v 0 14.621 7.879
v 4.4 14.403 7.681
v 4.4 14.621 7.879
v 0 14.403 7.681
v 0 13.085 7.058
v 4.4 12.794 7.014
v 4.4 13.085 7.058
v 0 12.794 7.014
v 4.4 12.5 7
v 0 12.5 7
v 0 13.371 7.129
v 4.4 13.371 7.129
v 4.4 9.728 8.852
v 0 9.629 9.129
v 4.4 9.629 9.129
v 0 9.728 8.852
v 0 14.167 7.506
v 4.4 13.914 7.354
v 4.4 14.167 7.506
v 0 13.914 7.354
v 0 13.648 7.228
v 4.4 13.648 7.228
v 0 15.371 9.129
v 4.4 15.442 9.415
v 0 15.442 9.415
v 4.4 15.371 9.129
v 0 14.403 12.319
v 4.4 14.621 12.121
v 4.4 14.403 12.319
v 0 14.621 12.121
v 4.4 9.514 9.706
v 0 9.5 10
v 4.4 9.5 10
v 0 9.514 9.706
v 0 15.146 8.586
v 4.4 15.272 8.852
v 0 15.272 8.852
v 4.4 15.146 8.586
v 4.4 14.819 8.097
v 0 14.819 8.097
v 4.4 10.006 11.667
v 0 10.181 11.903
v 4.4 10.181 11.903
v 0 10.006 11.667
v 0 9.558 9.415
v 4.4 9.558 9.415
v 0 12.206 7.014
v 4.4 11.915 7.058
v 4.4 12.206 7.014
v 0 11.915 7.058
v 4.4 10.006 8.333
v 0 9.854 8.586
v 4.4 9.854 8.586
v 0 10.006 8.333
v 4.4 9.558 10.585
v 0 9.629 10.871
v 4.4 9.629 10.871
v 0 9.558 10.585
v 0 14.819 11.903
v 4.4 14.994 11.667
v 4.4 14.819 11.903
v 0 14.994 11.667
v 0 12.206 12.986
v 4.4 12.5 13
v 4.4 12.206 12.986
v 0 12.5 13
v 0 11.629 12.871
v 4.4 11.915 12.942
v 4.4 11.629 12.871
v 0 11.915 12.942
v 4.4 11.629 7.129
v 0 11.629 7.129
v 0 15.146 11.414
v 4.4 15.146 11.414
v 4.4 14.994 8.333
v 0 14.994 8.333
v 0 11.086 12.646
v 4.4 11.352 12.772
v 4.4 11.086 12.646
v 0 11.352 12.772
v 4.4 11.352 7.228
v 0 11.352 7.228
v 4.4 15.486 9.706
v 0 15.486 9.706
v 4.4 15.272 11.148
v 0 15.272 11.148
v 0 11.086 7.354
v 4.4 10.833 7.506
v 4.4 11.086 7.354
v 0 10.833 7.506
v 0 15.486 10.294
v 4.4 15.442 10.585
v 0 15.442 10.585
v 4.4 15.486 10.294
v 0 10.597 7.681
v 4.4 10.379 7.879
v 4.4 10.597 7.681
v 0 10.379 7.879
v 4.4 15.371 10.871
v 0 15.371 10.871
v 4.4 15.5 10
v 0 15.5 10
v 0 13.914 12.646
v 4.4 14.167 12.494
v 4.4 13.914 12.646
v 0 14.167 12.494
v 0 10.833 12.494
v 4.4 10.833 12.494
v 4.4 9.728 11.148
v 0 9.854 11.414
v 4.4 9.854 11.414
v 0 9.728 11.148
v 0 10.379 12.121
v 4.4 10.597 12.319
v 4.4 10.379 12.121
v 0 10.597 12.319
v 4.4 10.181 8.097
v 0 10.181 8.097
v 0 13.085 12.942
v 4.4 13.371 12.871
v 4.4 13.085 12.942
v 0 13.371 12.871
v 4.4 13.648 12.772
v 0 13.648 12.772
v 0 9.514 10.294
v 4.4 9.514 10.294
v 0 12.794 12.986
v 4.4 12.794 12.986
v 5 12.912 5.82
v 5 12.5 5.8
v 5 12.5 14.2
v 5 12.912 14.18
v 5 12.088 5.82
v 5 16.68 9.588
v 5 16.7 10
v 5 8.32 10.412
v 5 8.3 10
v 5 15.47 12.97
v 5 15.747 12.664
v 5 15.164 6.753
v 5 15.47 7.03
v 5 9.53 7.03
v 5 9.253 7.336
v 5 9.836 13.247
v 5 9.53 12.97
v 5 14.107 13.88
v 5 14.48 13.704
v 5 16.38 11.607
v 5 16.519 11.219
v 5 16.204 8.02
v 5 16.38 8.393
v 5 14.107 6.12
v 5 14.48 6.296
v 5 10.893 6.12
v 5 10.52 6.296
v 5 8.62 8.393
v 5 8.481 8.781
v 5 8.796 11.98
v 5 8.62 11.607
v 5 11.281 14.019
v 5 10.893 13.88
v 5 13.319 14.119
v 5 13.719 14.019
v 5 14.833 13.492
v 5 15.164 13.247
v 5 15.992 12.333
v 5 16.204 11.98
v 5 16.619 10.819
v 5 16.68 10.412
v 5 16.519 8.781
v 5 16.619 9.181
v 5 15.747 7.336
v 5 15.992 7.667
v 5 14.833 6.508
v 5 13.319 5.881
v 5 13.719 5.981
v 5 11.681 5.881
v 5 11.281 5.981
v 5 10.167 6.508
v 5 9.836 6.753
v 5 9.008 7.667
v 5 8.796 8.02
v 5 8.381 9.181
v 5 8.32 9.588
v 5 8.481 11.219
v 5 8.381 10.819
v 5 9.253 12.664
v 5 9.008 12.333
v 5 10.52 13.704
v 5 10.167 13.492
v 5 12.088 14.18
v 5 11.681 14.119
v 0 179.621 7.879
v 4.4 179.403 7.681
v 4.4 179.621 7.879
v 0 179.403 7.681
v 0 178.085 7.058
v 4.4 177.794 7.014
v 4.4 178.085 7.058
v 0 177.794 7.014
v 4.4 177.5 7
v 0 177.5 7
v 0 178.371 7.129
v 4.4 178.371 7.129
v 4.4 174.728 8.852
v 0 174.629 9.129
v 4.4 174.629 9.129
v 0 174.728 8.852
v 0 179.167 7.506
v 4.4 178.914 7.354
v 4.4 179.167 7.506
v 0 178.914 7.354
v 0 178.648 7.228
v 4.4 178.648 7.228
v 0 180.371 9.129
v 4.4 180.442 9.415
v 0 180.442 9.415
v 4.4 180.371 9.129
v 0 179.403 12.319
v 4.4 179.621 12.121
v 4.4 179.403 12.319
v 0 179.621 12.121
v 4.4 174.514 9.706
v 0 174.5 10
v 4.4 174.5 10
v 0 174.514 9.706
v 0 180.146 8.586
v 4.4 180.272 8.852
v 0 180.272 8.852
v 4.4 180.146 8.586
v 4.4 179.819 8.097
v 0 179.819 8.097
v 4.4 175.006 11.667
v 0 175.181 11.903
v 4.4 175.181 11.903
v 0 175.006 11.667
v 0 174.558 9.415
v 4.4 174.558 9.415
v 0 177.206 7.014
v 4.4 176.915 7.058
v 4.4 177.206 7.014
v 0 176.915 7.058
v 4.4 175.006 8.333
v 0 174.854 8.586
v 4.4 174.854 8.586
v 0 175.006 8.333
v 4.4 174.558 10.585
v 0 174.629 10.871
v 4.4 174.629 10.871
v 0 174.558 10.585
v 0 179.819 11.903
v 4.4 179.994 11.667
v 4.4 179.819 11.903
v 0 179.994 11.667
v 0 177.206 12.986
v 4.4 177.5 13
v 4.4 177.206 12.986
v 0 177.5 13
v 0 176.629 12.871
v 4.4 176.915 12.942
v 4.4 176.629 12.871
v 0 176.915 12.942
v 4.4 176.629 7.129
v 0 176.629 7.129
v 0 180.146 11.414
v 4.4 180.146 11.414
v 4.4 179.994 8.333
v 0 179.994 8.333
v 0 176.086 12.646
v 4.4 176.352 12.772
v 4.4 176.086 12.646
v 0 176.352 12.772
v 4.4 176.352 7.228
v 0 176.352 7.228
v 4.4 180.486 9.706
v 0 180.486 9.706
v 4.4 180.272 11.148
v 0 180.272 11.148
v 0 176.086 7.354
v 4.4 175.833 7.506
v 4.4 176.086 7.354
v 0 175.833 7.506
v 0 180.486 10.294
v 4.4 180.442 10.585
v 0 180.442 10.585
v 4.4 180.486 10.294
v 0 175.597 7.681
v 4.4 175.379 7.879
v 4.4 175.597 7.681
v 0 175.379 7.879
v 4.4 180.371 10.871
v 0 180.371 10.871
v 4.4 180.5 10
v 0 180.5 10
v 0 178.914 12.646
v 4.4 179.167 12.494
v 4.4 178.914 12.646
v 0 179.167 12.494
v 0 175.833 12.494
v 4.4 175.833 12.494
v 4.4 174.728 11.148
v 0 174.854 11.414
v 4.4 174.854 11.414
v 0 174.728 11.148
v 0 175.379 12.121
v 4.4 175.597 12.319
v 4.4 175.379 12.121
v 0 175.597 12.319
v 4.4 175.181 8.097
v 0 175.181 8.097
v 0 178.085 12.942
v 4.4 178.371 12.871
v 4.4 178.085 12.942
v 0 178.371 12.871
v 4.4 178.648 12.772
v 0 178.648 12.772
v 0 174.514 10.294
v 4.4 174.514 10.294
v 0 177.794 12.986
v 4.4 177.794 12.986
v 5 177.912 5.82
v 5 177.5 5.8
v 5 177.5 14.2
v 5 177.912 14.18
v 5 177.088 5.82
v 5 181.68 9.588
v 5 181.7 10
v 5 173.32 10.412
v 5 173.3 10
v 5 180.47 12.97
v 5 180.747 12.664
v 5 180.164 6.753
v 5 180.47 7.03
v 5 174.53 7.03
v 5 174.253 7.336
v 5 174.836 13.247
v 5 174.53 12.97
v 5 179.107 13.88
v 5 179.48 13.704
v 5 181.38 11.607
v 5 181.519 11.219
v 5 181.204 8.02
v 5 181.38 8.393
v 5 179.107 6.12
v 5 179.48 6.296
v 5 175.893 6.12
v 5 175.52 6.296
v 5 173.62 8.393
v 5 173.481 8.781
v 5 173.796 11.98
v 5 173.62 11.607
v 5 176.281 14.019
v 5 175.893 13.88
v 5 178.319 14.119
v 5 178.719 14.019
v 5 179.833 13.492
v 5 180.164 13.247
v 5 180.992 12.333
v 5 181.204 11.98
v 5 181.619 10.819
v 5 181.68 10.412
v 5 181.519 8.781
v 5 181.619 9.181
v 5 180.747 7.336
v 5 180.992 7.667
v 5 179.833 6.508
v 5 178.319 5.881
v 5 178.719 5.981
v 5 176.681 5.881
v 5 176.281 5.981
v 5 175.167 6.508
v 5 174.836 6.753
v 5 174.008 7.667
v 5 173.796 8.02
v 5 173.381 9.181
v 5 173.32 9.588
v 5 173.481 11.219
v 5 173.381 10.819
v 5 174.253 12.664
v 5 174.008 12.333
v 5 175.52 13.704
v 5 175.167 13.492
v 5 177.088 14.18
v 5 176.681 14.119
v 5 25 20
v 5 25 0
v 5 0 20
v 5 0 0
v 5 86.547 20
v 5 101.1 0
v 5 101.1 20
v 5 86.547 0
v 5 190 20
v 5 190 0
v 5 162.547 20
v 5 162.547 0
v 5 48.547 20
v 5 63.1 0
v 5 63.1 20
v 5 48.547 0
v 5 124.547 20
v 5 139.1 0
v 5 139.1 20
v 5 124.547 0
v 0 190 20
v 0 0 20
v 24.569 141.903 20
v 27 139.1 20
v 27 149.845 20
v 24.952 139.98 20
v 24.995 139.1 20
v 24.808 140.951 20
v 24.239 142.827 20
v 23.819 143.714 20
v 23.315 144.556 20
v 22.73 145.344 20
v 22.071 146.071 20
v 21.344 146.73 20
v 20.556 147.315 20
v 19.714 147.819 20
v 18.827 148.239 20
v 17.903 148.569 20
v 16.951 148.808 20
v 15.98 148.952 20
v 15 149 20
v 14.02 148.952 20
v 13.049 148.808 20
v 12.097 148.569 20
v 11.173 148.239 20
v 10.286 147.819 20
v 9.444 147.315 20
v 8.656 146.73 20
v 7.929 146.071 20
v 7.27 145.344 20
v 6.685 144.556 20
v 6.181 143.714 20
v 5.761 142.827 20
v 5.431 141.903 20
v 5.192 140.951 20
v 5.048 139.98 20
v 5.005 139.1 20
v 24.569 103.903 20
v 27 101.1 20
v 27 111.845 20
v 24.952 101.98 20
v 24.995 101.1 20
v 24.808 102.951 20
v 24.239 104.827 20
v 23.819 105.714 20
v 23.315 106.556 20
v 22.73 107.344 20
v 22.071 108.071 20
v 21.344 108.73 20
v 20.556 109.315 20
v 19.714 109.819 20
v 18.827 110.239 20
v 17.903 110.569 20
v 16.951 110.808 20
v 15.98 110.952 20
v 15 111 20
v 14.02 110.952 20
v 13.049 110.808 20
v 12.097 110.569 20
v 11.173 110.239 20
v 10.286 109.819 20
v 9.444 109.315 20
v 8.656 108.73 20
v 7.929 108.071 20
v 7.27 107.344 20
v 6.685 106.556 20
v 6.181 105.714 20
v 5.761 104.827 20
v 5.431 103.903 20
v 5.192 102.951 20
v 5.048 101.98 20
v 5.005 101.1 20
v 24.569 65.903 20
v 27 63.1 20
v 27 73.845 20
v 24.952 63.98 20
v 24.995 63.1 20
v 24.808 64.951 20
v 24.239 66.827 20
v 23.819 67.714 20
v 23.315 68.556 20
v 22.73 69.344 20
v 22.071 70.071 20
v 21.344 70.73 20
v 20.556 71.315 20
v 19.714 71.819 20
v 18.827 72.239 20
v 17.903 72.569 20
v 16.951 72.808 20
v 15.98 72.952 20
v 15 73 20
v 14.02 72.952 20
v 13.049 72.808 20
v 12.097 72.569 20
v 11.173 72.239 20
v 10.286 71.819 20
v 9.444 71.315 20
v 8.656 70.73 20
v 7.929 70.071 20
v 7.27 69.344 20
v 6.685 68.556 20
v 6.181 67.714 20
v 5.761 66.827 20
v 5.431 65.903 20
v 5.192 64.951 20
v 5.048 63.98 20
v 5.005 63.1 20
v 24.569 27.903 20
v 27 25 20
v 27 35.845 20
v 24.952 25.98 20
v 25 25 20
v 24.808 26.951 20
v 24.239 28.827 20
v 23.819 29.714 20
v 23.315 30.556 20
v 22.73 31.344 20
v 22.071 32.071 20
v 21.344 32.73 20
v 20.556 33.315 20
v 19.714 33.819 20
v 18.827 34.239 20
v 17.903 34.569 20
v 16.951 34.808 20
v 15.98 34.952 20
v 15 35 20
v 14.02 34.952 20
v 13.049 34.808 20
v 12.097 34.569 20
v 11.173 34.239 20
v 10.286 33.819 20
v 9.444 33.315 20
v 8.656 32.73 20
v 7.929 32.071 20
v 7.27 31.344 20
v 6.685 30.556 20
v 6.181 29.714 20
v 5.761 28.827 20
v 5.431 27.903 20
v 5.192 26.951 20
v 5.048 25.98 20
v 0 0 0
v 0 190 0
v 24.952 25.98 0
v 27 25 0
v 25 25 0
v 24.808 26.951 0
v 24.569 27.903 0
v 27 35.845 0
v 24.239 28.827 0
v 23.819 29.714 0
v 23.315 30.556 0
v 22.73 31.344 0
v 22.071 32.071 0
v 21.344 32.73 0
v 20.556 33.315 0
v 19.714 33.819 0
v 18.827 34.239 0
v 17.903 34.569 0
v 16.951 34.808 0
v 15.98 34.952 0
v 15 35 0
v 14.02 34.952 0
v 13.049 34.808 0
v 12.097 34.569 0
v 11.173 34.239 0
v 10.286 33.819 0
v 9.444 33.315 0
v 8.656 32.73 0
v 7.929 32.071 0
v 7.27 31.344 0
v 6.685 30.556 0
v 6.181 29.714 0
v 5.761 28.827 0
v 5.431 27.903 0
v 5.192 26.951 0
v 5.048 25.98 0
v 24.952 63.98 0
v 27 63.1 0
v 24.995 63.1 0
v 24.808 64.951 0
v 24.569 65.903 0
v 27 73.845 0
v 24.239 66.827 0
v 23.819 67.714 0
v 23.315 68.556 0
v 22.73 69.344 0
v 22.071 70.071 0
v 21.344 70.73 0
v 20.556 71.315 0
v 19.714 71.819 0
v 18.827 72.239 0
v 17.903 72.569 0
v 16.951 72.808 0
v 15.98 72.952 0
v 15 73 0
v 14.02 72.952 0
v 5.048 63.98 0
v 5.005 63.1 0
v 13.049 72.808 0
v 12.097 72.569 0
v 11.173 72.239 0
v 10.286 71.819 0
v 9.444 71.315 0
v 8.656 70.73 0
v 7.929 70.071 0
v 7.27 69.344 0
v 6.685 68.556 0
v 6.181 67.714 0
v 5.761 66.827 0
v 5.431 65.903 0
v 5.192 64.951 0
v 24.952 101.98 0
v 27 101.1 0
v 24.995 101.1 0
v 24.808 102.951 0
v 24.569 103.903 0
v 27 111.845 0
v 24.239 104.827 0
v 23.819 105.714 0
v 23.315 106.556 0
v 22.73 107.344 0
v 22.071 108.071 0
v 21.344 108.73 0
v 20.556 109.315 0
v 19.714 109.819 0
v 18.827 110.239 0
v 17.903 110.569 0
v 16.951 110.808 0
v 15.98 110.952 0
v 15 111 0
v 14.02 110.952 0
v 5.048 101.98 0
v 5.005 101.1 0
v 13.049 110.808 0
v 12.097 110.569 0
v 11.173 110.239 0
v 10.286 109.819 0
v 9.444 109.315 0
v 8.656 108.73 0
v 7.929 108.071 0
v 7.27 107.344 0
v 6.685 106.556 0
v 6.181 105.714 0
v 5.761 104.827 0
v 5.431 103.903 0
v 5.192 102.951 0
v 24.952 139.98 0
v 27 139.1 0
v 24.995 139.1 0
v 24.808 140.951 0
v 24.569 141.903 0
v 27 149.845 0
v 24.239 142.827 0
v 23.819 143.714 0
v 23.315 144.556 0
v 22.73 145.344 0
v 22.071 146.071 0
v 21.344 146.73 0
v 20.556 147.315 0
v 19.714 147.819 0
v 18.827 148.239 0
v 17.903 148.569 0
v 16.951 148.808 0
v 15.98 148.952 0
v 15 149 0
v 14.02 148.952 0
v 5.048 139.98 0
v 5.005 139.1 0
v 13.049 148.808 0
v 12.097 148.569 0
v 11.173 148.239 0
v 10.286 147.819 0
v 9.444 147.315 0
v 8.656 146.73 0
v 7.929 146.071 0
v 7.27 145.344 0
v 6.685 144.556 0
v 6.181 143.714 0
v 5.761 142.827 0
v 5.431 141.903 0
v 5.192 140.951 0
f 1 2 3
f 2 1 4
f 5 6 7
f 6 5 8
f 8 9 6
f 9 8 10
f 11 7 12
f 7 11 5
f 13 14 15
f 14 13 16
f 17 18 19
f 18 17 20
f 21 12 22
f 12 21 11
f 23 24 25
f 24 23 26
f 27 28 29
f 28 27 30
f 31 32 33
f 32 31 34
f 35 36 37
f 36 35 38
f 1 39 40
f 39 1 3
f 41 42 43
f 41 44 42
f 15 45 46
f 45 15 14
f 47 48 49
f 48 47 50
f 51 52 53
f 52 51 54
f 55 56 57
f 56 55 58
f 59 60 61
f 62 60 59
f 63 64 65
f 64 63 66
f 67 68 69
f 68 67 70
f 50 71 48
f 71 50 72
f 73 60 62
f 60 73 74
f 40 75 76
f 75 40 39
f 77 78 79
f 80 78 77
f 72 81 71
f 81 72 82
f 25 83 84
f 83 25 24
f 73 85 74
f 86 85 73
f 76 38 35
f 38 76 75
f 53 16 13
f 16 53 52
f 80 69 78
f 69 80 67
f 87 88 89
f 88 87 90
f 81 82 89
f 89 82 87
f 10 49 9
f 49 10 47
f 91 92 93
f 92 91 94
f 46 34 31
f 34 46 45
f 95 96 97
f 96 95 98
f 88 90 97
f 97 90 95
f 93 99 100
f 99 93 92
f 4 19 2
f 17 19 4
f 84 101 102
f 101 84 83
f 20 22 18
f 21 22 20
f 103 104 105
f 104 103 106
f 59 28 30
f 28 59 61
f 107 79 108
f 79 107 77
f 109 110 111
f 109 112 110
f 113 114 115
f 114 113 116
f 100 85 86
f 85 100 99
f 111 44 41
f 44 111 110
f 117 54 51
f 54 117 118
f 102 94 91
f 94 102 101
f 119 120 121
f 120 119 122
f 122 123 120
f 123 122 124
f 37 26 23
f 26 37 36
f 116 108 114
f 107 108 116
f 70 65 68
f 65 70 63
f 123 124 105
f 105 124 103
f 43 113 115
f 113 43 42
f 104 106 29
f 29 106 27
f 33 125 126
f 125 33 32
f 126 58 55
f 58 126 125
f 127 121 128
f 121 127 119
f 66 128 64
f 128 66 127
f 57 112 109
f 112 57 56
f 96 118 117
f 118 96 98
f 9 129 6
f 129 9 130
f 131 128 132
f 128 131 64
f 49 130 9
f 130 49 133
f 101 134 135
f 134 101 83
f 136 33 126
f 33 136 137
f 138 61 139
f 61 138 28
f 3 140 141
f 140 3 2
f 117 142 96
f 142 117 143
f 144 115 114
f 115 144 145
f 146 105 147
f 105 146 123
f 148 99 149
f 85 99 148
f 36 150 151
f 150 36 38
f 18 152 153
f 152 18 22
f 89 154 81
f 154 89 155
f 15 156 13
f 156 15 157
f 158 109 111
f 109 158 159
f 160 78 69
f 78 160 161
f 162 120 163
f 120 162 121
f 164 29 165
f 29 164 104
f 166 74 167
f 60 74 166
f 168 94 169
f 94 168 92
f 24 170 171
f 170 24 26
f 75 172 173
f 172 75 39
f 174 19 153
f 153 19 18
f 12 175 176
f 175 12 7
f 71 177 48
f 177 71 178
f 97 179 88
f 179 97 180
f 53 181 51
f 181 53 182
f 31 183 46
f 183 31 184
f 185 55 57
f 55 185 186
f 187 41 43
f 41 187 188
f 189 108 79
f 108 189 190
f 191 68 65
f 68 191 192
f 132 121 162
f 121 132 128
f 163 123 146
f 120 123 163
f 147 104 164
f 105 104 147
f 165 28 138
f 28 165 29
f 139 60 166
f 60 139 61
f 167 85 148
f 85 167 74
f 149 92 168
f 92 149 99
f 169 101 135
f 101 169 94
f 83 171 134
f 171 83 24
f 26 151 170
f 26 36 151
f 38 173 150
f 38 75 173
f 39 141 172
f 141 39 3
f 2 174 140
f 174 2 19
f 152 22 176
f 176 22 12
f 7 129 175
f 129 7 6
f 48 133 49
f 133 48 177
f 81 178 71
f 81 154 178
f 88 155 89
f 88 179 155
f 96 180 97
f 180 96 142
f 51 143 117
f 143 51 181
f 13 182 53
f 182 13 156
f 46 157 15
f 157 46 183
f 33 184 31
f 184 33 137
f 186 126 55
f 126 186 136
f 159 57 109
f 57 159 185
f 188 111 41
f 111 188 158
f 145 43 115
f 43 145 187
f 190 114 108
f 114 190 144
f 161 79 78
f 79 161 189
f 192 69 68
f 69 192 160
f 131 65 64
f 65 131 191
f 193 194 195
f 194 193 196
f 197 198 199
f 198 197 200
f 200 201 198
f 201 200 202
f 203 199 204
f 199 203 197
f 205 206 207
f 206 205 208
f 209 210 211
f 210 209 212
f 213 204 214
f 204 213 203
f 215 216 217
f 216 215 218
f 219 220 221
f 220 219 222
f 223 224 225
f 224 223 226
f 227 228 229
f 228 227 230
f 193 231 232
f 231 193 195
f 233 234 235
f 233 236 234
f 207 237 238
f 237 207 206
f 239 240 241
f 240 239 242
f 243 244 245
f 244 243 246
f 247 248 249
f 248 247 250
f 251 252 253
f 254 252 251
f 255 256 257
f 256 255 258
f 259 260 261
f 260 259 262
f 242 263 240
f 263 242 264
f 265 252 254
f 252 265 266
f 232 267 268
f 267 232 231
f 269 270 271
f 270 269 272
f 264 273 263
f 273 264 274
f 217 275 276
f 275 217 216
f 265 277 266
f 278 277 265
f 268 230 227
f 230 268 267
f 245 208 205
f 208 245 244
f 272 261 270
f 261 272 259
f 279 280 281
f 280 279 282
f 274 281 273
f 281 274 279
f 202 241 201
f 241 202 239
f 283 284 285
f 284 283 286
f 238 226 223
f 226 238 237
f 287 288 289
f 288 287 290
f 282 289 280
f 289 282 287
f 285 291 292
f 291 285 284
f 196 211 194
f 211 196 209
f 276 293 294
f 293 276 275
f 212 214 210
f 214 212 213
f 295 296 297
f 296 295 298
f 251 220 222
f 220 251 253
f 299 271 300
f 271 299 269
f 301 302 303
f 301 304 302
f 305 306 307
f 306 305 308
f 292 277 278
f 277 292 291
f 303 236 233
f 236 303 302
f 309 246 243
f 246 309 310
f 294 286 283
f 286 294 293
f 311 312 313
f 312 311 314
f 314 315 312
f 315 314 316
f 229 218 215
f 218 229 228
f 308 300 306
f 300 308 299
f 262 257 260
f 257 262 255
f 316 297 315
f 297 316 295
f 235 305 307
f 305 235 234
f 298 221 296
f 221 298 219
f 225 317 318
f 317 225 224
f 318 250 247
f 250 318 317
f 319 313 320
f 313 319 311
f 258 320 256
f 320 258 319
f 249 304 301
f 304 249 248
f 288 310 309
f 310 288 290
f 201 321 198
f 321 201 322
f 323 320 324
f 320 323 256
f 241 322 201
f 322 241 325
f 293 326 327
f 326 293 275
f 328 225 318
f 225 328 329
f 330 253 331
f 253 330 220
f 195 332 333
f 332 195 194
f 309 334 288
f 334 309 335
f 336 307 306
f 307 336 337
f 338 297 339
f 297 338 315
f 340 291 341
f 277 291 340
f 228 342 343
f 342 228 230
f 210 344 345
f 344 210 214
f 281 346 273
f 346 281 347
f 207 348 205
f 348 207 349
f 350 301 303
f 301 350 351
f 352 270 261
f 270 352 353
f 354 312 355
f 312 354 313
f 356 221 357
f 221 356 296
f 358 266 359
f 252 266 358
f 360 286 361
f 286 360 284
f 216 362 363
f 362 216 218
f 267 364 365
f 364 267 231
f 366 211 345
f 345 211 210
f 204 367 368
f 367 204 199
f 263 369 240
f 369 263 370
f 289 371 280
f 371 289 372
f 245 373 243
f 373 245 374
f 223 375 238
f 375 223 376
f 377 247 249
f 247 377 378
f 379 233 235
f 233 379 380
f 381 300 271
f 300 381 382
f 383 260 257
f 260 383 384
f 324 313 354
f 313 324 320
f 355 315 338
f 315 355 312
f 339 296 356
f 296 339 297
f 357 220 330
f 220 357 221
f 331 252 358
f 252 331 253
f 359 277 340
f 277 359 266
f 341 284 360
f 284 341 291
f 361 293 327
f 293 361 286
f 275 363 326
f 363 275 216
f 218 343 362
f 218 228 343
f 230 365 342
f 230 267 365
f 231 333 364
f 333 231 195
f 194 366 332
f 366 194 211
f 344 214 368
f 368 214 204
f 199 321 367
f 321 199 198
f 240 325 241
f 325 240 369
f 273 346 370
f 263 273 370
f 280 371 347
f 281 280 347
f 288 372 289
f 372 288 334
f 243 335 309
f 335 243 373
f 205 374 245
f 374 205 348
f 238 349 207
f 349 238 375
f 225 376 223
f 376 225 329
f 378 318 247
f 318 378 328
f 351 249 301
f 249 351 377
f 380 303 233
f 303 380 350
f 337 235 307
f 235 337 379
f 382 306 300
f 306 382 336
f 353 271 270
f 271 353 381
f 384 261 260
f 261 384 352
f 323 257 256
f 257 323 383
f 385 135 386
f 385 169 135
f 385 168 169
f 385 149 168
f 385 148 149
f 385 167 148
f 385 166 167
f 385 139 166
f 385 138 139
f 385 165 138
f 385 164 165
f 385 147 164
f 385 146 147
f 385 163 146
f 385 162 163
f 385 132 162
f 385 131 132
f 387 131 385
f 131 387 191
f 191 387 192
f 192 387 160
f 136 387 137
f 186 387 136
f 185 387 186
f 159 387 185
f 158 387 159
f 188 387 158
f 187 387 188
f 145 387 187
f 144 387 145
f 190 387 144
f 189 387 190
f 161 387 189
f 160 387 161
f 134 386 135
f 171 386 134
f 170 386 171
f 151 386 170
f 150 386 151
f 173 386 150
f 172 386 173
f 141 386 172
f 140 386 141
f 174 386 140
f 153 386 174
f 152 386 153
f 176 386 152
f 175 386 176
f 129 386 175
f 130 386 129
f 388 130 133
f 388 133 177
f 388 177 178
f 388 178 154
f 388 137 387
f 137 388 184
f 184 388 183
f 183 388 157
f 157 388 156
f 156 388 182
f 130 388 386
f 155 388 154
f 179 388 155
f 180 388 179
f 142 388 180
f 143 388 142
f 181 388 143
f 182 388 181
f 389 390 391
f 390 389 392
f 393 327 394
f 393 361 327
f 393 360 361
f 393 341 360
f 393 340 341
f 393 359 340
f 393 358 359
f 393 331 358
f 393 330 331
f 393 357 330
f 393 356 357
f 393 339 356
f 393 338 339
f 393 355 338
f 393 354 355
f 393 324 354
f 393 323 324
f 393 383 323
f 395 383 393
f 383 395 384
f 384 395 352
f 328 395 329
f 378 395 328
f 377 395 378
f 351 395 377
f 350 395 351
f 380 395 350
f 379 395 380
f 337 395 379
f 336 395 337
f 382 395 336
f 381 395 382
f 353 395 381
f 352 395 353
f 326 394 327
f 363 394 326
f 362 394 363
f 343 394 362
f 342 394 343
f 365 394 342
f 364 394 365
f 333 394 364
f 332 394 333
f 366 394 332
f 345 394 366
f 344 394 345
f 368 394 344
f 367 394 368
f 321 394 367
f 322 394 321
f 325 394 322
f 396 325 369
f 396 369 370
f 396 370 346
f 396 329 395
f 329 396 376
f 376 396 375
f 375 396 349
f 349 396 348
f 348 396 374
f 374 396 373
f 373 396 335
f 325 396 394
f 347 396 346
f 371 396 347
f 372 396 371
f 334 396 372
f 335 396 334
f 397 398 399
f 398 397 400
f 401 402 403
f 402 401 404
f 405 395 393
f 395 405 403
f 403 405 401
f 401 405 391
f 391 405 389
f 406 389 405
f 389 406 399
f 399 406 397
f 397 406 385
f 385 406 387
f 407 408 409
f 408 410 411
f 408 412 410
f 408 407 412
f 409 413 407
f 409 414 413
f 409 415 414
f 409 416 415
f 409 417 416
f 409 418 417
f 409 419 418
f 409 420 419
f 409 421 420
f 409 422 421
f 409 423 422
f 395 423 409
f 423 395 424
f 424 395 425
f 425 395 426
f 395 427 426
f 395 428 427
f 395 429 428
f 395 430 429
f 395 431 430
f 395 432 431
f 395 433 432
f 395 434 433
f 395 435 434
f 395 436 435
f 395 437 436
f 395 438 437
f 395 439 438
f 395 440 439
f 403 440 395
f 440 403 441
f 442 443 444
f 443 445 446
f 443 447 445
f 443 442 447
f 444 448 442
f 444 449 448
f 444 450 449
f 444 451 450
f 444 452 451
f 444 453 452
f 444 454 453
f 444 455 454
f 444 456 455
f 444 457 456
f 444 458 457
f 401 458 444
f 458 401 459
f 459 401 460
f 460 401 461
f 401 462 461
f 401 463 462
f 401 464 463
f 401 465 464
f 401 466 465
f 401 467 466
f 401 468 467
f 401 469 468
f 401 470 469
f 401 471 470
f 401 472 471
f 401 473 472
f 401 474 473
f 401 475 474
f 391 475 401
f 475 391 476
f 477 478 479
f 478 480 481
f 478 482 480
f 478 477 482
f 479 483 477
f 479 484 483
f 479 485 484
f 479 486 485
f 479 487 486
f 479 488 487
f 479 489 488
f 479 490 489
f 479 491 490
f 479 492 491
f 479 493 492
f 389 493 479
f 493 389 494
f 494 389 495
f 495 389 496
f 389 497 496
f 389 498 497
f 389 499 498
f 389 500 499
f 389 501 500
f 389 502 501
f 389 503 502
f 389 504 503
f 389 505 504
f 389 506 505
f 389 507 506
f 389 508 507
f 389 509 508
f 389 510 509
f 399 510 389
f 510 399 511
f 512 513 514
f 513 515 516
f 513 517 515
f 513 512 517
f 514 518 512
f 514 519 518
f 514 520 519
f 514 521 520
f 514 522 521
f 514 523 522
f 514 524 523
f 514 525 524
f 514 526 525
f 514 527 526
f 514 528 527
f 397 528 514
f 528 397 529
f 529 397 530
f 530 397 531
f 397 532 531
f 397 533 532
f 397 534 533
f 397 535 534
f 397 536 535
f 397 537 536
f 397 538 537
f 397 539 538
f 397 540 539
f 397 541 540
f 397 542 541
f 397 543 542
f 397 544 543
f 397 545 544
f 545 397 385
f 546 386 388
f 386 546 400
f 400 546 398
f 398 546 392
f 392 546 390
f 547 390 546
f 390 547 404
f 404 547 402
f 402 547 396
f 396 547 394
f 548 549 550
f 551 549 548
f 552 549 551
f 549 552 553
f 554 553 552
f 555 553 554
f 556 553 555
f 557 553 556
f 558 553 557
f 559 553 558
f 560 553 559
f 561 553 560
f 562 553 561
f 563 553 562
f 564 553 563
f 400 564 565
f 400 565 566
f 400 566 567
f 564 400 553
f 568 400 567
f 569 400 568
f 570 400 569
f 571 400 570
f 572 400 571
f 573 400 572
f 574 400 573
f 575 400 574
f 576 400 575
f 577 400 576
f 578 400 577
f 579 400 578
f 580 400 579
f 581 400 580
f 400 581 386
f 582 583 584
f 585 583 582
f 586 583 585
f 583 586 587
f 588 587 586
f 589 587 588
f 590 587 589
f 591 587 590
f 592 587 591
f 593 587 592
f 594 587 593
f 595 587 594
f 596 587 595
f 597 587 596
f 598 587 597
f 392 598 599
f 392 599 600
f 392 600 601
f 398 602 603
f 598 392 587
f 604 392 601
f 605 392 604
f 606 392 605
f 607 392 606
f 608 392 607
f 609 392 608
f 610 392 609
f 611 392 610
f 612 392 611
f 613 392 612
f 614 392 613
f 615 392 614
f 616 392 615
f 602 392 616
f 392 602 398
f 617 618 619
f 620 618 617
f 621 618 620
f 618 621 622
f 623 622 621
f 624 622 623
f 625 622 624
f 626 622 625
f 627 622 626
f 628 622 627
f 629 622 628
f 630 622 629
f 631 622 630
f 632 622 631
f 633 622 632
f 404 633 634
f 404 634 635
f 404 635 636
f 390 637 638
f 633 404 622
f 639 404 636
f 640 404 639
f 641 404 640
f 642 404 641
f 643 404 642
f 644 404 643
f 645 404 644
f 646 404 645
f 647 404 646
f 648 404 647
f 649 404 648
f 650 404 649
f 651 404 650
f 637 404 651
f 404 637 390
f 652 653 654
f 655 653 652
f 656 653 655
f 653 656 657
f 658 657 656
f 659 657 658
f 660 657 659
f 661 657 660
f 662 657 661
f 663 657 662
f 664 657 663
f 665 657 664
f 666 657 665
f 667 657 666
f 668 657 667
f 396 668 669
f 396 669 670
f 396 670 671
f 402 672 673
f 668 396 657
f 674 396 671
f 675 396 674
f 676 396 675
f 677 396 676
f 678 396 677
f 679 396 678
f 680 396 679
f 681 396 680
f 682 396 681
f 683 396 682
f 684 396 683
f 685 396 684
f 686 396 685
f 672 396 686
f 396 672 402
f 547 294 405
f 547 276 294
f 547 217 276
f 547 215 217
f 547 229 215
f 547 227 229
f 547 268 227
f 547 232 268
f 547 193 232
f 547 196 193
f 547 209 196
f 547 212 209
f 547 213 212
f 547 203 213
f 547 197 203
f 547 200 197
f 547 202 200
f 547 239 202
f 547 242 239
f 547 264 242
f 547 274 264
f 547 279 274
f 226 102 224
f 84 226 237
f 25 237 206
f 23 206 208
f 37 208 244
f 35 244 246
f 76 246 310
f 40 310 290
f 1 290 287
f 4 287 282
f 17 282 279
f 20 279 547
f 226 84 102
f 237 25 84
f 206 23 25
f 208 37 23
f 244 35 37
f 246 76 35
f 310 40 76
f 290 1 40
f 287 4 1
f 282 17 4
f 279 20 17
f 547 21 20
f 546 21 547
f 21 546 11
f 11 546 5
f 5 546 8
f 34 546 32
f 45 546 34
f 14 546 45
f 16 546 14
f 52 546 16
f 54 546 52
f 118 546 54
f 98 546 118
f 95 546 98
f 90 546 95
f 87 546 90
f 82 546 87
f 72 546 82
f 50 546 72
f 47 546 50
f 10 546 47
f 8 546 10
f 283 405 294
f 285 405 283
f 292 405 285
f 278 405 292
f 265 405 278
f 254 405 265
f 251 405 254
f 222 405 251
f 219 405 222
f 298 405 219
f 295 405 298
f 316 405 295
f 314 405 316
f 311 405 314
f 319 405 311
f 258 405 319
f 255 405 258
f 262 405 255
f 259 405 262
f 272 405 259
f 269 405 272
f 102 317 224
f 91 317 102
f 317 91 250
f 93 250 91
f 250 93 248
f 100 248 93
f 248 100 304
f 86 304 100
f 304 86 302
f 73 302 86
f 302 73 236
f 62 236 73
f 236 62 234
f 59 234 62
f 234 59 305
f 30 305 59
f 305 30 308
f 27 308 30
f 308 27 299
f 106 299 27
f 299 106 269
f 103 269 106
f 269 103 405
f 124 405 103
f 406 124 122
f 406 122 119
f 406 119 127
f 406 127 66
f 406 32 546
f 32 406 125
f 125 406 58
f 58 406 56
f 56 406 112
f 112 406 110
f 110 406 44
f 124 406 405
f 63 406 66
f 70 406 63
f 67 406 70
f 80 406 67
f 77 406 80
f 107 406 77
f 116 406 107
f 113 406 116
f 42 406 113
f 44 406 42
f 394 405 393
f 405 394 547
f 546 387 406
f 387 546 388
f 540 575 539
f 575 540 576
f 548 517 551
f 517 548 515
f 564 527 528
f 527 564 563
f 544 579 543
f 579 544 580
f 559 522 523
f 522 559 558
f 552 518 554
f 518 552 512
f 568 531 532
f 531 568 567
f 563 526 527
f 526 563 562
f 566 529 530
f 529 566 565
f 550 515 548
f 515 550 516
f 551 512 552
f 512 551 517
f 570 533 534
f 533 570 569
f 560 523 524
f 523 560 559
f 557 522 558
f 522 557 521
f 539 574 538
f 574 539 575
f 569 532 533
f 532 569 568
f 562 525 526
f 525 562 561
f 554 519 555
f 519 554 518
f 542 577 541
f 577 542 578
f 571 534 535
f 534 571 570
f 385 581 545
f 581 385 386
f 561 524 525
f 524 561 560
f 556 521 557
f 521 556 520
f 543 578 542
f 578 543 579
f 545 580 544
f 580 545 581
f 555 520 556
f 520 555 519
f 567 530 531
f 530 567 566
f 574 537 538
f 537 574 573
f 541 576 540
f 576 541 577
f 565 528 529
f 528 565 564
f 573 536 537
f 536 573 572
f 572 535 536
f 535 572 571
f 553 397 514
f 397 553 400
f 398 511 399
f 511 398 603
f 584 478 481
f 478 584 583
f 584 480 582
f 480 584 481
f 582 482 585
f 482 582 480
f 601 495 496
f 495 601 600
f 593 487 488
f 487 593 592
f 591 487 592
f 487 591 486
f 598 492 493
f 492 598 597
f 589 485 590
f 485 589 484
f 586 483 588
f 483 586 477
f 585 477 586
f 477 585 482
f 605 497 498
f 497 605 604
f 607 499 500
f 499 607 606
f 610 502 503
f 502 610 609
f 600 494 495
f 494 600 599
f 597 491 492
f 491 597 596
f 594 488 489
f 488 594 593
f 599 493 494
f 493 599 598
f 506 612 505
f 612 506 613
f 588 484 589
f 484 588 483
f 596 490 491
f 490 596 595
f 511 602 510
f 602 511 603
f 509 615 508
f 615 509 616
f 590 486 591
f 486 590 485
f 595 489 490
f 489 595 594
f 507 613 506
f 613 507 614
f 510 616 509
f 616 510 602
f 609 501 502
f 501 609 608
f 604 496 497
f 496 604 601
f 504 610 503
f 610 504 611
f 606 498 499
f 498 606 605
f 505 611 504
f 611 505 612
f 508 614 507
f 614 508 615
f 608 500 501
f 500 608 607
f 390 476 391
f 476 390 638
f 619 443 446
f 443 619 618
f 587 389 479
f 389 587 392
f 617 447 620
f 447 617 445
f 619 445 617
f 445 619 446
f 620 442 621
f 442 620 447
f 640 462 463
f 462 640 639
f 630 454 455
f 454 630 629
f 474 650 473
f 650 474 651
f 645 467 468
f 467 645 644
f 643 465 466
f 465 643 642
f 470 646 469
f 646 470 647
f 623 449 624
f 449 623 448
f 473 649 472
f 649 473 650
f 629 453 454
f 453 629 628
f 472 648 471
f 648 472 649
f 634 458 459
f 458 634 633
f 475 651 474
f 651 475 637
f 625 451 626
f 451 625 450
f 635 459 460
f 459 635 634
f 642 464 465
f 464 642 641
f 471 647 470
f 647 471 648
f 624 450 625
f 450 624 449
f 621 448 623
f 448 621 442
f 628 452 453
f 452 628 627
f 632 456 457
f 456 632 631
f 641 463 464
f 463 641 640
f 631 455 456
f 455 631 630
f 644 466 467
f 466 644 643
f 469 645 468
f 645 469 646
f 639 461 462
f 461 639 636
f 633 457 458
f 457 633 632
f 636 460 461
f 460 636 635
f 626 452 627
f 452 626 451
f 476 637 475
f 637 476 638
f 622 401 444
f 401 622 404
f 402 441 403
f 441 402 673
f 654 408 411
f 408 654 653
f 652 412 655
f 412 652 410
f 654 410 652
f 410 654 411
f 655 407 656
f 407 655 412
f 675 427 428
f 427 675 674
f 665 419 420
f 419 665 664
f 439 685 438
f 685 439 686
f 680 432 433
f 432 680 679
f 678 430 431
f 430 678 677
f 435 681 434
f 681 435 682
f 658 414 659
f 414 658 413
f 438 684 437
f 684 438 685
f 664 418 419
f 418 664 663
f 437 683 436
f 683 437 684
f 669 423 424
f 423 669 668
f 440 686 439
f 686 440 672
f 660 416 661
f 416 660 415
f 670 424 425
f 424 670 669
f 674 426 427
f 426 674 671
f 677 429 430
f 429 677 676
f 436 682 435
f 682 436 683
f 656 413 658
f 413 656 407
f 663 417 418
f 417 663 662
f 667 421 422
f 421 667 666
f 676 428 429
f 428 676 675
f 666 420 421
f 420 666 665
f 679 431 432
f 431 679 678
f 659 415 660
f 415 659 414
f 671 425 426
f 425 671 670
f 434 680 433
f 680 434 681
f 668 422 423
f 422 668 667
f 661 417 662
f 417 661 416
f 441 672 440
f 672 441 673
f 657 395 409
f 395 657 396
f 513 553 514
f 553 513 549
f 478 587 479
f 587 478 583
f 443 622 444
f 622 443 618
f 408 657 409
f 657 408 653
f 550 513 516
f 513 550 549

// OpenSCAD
$fn=64;
L=190;     //длина планки
H=5;       //толщина планки
td=20;     //диаметр под трубу

xd=38;     // расстояние между трубками
dd=25;     //расстояние от края до отверстий
N=5;       //количество труб
w=20;      //ширина упора

difference(){
    cube([H,L,w]);
    translate([-0.1,dd/2,w/2])rotate([0,90,0]){
        cylinder(r=3,h=H+0.2);
        translate([0,0,H-2])cylinder(r1=0,r2=5,h=2.5);
        }
    translate([-0.1,L-dd/2,w/2])rotate([0,90,0]){
        cylinder(r=3,h=H+0.2);
        translate([0,0,H-2])cylinder(r1=0,r2=5,h=2.5);
        }
}
difference(){
    translate([H,dd,0])cube([td+2,L-dd*2,w]);
    for (i=[0:N-1]){
        translate([H+td/2,dd+i*xd,-0.1])cylinder(d=td,h=w+0.2);
       hull(){
           translate([H,(td/sin(60))/2+dd+td/2+2+i*xd,-0.1])rotate([0,0,-30])cube([td/sin(60)+2.1+1,0.2,w+0.2]);
           translate([H,dd+(i+1)*xd,-0.1])cube([td+2.1,0.1,w+0.2]);
       }
    }  
}
